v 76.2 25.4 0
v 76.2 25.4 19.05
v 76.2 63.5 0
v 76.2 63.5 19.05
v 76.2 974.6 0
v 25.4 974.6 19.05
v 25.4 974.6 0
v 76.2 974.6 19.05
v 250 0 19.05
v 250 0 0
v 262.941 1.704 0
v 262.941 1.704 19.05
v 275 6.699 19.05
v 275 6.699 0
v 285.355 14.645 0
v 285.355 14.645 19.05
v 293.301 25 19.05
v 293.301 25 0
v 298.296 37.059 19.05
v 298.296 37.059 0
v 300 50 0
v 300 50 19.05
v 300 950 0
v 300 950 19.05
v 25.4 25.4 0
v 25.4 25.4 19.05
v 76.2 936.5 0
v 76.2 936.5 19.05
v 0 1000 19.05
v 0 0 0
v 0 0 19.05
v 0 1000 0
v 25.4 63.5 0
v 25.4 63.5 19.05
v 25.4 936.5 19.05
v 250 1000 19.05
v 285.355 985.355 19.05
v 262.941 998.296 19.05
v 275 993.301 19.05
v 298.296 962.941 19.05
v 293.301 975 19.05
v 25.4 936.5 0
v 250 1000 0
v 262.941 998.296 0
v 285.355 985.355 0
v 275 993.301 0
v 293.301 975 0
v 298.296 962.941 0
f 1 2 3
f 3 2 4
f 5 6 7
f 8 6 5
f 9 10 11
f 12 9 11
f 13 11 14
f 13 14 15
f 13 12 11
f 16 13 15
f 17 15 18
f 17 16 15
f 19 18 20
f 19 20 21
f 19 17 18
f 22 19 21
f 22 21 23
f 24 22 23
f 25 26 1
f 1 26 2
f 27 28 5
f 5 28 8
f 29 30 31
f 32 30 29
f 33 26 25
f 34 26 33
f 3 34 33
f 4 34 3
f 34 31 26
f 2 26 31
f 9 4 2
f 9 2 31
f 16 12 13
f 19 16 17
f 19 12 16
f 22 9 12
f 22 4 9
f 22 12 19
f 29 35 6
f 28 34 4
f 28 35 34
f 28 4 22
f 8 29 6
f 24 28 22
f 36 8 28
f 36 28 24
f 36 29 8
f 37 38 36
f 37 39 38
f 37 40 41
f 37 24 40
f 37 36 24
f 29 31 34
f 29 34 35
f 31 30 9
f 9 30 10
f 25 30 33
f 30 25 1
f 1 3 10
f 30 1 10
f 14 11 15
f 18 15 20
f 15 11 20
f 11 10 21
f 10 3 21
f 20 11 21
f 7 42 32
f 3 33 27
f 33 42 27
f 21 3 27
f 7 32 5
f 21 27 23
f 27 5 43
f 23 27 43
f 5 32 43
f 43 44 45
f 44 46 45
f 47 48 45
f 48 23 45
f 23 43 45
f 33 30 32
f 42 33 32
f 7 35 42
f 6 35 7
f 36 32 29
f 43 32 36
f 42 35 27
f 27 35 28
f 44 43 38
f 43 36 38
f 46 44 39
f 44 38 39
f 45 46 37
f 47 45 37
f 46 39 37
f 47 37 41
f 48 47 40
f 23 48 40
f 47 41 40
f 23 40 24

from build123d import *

# Parameters (mm, degrees)
F0_W     = 300
F0_H     = 1000
F1_DEPTH = 19.05
F2_W     = 50.8
F2_H     = 38.1
F3_DEPTH = 19.05
F4_R     = 50


# Not quite as in the source:
# - a length typed as a fraction of an inch, garbled in the dataset ("3 / 203.2 mm" for 3/8 in), is restored


with BuildPart() as f1:
    # F0 (on Top) → F1 (new body)
    with BuildSketch(Plane.XY):
        with Locations((150, 500)):
            Rectangle(F0_W, F0_H)
    extrude(amount=F1_DEPTH)

    # F2 (on face) → F3 (cut, through all)
    with BuildSketch(Plane.XY.offset(19.05)):
        with Locations((50.8, 44.45)):
            Rectangle(F2_W, F2_H)
        with Locations((50.8, 955.55)):
            Rectangle(F2_W, F2_H)
    extrude(amount=-F3_DEPTH, mode=Mode.SUBTRACT)

    # F4
    f4_edges = [f1.edges().sort_by_distance(p)[0] for p in [
        (300, 0, 9.525),
        (300, 1000, 9.525),
    ]]
    fillet(f4_edges, radius=F4_R)


solid = f1.part
